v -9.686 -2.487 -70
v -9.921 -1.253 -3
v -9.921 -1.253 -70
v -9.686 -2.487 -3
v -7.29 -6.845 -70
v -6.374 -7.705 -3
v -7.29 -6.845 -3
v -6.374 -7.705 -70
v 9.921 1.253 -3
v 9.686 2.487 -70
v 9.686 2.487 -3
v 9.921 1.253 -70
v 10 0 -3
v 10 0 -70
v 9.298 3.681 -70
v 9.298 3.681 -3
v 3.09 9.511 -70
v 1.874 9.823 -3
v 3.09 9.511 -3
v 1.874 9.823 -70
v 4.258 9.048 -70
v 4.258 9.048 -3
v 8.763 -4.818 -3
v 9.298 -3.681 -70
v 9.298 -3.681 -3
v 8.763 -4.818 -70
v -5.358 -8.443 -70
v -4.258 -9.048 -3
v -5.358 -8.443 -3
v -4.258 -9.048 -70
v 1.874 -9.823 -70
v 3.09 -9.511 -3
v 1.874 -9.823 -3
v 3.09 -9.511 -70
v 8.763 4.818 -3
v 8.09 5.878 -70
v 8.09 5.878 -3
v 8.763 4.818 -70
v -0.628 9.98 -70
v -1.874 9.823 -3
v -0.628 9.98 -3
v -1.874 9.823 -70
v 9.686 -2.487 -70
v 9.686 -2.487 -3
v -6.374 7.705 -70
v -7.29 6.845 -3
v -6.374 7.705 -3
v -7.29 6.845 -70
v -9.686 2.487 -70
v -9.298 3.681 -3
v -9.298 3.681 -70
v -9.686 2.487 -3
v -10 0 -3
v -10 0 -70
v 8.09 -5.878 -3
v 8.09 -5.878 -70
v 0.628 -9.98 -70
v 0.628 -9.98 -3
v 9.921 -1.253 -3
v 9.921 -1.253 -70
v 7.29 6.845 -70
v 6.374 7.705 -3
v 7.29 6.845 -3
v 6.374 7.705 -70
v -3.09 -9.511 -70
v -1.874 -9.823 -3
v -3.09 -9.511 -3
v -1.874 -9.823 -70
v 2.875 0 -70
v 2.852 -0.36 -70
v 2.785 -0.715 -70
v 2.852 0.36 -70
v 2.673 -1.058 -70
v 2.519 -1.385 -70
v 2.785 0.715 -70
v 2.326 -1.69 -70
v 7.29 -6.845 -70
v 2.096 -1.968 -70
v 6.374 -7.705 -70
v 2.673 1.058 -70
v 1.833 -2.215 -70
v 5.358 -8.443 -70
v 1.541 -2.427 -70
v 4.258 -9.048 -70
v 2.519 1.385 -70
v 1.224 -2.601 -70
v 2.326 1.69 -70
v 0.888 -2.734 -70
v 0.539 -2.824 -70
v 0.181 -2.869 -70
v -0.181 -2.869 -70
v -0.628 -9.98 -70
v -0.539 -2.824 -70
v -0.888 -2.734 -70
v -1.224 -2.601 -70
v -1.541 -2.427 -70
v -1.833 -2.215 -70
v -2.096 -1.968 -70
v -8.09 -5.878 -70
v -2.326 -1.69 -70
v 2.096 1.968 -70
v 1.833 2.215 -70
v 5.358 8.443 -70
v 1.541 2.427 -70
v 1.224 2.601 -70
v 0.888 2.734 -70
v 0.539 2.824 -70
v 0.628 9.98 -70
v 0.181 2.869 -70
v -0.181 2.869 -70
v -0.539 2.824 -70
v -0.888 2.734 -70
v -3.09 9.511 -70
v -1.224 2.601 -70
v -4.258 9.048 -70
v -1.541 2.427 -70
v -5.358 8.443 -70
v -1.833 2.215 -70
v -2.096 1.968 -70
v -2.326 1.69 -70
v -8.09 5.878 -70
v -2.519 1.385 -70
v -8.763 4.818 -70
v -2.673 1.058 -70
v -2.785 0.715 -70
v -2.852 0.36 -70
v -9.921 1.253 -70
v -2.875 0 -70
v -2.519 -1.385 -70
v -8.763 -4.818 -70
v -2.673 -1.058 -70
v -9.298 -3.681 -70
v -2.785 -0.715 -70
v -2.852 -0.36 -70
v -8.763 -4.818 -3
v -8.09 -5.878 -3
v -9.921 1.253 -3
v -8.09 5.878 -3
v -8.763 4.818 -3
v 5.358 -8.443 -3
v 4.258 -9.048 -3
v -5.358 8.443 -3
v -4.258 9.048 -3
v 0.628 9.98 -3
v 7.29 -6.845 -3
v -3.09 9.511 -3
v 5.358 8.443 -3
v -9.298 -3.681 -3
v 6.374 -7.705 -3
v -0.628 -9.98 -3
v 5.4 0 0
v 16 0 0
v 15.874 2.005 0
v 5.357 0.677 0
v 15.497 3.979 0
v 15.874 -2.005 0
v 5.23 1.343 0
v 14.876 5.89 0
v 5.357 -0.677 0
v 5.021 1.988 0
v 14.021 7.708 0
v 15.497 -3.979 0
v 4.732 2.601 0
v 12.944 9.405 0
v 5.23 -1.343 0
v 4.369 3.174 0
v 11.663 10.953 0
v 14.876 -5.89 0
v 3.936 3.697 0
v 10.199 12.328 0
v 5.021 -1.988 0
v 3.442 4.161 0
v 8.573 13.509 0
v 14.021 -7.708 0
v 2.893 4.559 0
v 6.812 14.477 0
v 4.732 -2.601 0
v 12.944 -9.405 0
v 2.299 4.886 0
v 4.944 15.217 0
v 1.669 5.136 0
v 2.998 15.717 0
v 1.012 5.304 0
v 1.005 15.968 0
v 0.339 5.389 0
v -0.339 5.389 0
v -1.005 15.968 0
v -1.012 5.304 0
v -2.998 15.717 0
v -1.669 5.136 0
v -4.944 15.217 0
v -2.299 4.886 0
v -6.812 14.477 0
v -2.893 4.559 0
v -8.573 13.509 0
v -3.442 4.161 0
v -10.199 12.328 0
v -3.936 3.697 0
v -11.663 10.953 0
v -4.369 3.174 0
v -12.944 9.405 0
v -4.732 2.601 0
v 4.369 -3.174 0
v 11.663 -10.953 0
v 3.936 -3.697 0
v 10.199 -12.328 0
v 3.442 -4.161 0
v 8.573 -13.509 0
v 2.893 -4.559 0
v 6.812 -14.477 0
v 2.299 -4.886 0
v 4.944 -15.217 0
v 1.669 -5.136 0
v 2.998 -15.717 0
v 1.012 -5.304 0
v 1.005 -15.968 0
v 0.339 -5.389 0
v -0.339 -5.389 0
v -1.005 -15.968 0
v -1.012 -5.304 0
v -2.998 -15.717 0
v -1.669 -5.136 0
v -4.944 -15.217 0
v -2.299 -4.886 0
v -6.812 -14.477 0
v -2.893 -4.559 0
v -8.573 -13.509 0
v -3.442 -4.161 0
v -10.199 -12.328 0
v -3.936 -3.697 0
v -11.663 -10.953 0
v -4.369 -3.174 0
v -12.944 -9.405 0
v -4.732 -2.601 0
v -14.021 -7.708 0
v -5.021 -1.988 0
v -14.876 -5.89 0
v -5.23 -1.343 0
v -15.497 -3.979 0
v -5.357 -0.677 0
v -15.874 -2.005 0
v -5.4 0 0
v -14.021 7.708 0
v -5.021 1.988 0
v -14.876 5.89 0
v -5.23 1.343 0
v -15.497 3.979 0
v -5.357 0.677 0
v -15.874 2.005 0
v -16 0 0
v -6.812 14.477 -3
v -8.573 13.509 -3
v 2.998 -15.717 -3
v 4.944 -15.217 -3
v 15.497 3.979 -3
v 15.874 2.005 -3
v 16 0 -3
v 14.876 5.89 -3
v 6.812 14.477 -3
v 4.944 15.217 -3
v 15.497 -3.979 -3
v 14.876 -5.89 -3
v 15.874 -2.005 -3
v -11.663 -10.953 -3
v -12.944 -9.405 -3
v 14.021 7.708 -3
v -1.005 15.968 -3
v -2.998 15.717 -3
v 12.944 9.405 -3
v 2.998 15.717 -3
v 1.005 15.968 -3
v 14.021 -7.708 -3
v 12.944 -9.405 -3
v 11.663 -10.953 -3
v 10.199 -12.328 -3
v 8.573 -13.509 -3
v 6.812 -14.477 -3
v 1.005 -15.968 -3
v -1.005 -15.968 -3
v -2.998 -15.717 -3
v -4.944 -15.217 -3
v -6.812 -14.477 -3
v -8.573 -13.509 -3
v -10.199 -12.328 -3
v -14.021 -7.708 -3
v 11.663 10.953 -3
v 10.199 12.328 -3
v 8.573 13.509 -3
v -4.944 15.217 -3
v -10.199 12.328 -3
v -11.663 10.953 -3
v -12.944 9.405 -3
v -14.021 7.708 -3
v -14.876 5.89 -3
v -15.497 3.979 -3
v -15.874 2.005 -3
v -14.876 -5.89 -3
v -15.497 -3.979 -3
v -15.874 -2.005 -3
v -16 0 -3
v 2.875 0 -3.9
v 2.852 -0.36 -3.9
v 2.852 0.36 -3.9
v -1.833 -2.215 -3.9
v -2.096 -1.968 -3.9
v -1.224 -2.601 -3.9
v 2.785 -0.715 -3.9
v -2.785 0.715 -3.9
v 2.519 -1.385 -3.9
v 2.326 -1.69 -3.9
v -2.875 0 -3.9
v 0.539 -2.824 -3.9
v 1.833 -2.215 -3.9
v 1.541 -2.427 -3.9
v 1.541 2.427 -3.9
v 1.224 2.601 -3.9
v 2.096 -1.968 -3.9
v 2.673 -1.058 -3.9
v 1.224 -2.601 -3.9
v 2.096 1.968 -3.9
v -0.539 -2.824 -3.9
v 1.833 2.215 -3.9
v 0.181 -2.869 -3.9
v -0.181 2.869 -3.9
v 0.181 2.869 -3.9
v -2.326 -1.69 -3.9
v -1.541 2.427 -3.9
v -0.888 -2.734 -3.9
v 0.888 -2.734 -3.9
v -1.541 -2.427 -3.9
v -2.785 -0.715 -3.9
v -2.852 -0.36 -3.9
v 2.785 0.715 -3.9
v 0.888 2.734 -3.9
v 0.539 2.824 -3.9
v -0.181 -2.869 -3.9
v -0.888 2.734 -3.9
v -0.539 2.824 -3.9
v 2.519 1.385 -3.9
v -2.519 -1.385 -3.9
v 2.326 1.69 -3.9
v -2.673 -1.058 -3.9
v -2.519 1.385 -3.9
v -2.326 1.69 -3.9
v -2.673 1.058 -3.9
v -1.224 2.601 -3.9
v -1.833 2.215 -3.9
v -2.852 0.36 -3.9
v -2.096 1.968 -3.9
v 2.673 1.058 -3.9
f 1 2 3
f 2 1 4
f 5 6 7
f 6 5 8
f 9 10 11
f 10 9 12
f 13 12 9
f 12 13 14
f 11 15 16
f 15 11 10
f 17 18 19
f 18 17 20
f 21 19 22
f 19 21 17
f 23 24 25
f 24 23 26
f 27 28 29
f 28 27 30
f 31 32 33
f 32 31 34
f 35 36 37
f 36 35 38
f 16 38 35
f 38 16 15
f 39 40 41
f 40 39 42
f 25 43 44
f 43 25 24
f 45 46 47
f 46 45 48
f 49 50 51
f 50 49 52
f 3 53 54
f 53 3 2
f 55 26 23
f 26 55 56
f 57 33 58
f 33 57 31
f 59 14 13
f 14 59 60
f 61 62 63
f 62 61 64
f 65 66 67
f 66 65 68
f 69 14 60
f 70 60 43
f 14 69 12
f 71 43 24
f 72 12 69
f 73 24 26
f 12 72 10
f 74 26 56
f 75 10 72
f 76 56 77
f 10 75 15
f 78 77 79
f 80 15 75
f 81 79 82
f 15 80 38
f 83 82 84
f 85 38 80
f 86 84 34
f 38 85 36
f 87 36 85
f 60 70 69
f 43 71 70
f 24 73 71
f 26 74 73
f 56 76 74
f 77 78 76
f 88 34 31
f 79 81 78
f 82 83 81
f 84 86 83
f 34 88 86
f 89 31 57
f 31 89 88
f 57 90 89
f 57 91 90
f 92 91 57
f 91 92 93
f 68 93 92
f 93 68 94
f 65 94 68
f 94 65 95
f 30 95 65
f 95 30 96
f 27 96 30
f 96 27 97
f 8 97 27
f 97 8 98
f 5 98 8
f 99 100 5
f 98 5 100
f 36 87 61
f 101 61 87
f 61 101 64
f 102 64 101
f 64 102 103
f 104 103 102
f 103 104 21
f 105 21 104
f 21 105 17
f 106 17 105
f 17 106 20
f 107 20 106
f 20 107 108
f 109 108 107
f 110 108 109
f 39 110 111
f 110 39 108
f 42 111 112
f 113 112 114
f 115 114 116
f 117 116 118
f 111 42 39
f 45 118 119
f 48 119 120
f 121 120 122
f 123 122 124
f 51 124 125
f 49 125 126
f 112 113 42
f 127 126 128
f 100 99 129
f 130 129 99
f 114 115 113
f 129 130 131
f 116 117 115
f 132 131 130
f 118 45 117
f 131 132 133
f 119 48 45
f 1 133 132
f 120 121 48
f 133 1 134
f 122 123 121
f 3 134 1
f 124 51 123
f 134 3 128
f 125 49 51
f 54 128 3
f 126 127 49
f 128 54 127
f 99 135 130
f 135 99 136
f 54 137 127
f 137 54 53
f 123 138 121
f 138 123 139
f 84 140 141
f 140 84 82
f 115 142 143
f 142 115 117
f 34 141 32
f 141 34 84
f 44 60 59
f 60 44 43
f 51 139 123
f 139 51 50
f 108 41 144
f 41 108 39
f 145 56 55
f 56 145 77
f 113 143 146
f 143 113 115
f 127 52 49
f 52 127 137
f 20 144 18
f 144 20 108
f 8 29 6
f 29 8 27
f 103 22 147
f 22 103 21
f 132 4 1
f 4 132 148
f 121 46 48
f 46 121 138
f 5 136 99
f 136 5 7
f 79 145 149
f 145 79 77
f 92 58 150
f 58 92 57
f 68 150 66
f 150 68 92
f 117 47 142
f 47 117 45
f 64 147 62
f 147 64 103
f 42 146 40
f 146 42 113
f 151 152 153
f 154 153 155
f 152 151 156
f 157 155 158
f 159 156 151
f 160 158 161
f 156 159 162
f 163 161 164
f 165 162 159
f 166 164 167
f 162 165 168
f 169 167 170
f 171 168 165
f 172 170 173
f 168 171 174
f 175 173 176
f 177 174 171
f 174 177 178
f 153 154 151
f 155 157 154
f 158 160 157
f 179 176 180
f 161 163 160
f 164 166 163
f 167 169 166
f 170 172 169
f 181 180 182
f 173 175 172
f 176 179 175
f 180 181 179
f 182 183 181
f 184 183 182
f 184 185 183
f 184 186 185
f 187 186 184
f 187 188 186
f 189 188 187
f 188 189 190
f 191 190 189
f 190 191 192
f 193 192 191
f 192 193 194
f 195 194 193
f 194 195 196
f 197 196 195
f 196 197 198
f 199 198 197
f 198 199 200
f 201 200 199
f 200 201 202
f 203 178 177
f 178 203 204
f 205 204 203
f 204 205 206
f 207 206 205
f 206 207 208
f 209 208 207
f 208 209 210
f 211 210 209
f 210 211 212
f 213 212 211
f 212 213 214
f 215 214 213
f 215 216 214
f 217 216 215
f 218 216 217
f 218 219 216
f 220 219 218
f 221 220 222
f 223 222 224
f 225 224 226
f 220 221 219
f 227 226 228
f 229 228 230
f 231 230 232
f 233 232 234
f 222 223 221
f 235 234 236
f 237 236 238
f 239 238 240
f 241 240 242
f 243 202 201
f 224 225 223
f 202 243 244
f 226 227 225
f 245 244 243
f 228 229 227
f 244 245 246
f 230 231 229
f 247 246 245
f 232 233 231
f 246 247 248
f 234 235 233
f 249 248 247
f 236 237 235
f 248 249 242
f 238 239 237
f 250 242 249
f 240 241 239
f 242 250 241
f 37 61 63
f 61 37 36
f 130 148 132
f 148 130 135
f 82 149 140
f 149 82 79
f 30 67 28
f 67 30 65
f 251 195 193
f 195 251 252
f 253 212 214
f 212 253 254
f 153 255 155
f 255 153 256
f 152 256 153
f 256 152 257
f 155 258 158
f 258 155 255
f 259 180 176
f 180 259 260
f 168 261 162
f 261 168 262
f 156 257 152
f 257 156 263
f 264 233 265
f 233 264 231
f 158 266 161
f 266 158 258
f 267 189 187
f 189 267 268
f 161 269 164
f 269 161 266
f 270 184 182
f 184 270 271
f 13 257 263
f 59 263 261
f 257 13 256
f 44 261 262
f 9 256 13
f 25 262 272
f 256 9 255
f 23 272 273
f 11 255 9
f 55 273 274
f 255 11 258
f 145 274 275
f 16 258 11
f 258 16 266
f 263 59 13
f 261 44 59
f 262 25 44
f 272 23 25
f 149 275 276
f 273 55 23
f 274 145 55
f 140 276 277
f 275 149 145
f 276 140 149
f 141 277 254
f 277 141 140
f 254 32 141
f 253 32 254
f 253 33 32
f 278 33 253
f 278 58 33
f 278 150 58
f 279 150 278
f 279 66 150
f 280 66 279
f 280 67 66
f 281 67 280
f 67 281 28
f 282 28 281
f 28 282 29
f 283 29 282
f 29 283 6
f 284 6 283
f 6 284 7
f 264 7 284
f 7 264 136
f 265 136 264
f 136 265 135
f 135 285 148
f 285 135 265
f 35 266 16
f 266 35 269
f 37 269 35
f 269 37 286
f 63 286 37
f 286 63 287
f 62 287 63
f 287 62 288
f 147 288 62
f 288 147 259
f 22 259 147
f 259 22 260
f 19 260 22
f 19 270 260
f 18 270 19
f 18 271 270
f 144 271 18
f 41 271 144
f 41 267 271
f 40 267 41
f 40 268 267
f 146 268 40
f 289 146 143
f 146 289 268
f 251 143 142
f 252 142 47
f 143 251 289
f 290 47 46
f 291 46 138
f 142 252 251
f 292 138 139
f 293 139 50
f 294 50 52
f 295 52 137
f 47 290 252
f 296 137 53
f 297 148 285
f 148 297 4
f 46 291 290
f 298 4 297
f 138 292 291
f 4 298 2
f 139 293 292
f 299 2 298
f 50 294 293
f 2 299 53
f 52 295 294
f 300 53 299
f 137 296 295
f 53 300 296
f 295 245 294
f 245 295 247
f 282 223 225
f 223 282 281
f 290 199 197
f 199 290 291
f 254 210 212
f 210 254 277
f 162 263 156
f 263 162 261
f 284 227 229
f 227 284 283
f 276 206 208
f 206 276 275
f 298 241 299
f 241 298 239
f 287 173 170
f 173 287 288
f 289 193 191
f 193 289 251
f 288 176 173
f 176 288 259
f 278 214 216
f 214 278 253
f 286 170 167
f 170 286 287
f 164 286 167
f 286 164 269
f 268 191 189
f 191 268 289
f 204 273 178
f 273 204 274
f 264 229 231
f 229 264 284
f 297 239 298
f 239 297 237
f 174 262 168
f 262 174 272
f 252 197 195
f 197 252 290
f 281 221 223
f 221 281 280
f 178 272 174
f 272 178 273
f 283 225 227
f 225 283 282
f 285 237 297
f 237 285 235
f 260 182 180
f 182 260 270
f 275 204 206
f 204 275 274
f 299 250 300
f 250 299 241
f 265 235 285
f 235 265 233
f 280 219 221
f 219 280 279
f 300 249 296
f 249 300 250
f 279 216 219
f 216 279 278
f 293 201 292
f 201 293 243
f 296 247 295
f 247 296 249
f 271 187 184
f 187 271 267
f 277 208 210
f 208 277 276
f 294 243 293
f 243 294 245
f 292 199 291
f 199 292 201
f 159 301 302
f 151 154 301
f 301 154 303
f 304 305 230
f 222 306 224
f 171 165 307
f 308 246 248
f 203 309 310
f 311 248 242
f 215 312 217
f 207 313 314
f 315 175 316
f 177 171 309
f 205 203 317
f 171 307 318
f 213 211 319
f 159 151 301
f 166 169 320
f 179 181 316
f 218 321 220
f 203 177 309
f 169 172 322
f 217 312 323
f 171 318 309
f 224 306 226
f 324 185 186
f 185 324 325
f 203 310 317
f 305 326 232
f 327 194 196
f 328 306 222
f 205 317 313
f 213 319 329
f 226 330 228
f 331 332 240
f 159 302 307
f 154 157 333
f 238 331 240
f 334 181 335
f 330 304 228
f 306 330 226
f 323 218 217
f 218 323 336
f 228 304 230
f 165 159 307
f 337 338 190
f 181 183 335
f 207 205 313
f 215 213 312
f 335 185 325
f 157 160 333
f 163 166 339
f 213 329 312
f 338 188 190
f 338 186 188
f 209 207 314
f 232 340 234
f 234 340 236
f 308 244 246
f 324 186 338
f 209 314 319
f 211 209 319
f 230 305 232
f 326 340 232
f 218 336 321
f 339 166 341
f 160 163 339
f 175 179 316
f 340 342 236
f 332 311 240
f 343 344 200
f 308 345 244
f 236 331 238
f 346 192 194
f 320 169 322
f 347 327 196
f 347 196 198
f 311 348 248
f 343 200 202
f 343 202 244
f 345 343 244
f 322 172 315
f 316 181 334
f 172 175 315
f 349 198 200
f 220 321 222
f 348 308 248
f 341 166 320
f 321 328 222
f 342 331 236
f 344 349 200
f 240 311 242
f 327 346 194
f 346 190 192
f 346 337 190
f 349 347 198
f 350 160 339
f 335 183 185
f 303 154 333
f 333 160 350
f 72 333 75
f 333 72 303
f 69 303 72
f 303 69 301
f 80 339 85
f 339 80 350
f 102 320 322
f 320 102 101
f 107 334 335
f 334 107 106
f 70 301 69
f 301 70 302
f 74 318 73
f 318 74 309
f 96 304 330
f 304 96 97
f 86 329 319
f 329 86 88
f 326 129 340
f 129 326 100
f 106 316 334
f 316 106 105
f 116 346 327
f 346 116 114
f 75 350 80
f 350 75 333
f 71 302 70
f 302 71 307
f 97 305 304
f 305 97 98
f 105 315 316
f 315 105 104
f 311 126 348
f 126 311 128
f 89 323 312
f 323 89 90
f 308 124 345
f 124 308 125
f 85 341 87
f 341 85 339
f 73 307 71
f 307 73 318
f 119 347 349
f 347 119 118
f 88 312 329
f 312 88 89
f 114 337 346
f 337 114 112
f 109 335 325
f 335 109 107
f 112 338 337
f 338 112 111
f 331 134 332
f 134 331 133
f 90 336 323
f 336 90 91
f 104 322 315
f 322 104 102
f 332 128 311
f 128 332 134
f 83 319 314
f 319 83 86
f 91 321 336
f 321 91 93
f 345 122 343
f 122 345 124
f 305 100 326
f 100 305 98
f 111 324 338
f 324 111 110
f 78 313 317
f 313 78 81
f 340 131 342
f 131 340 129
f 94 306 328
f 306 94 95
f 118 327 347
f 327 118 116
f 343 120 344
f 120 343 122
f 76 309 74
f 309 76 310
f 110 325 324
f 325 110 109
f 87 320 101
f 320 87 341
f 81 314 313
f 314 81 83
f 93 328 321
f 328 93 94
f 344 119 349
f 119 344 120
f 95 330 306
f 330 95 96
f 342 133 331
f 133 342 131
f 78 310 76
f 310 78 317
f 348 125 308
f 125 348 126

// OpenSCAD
$fn = 50;


difference() {
	union() {
		translate(v = [0, 0, -70.0000000000]) {
			cylinder(h = 70, r = 10.0000000000);
		}
		translate(v = [0, 0, -3.0000000000]) {
			cylinder(h = 3, r = 16.0000000000);
		}
	}
	union() {
		translate(v = [0, 0, 0]) {
			rotate(a = [0, 0, 0]) {
				difference() {
					union() {
						#translate(v = [0, 0, -70.0000000000]) {
							cylinder(h = 70, r = 2.6000000000);
						}
						#translate(v = [0, 0, -3.9000000000]) {
							cylinder(h = 3.9000000000, r = 10.0000000000, r1 = 2.8750000000, r2 = 5.4000000000);
						}
						#translate(v = [0, 0, -70.0000000000]) {
							cylinder(h = 70, r = 2.8750000000);
						}
						#translate(v = [0, 0, -70.0000000000]) {
							cylinder(h = 70, r = 2.6000000000);
						}
					}
					union();
				}
			}
		}
	}
}
